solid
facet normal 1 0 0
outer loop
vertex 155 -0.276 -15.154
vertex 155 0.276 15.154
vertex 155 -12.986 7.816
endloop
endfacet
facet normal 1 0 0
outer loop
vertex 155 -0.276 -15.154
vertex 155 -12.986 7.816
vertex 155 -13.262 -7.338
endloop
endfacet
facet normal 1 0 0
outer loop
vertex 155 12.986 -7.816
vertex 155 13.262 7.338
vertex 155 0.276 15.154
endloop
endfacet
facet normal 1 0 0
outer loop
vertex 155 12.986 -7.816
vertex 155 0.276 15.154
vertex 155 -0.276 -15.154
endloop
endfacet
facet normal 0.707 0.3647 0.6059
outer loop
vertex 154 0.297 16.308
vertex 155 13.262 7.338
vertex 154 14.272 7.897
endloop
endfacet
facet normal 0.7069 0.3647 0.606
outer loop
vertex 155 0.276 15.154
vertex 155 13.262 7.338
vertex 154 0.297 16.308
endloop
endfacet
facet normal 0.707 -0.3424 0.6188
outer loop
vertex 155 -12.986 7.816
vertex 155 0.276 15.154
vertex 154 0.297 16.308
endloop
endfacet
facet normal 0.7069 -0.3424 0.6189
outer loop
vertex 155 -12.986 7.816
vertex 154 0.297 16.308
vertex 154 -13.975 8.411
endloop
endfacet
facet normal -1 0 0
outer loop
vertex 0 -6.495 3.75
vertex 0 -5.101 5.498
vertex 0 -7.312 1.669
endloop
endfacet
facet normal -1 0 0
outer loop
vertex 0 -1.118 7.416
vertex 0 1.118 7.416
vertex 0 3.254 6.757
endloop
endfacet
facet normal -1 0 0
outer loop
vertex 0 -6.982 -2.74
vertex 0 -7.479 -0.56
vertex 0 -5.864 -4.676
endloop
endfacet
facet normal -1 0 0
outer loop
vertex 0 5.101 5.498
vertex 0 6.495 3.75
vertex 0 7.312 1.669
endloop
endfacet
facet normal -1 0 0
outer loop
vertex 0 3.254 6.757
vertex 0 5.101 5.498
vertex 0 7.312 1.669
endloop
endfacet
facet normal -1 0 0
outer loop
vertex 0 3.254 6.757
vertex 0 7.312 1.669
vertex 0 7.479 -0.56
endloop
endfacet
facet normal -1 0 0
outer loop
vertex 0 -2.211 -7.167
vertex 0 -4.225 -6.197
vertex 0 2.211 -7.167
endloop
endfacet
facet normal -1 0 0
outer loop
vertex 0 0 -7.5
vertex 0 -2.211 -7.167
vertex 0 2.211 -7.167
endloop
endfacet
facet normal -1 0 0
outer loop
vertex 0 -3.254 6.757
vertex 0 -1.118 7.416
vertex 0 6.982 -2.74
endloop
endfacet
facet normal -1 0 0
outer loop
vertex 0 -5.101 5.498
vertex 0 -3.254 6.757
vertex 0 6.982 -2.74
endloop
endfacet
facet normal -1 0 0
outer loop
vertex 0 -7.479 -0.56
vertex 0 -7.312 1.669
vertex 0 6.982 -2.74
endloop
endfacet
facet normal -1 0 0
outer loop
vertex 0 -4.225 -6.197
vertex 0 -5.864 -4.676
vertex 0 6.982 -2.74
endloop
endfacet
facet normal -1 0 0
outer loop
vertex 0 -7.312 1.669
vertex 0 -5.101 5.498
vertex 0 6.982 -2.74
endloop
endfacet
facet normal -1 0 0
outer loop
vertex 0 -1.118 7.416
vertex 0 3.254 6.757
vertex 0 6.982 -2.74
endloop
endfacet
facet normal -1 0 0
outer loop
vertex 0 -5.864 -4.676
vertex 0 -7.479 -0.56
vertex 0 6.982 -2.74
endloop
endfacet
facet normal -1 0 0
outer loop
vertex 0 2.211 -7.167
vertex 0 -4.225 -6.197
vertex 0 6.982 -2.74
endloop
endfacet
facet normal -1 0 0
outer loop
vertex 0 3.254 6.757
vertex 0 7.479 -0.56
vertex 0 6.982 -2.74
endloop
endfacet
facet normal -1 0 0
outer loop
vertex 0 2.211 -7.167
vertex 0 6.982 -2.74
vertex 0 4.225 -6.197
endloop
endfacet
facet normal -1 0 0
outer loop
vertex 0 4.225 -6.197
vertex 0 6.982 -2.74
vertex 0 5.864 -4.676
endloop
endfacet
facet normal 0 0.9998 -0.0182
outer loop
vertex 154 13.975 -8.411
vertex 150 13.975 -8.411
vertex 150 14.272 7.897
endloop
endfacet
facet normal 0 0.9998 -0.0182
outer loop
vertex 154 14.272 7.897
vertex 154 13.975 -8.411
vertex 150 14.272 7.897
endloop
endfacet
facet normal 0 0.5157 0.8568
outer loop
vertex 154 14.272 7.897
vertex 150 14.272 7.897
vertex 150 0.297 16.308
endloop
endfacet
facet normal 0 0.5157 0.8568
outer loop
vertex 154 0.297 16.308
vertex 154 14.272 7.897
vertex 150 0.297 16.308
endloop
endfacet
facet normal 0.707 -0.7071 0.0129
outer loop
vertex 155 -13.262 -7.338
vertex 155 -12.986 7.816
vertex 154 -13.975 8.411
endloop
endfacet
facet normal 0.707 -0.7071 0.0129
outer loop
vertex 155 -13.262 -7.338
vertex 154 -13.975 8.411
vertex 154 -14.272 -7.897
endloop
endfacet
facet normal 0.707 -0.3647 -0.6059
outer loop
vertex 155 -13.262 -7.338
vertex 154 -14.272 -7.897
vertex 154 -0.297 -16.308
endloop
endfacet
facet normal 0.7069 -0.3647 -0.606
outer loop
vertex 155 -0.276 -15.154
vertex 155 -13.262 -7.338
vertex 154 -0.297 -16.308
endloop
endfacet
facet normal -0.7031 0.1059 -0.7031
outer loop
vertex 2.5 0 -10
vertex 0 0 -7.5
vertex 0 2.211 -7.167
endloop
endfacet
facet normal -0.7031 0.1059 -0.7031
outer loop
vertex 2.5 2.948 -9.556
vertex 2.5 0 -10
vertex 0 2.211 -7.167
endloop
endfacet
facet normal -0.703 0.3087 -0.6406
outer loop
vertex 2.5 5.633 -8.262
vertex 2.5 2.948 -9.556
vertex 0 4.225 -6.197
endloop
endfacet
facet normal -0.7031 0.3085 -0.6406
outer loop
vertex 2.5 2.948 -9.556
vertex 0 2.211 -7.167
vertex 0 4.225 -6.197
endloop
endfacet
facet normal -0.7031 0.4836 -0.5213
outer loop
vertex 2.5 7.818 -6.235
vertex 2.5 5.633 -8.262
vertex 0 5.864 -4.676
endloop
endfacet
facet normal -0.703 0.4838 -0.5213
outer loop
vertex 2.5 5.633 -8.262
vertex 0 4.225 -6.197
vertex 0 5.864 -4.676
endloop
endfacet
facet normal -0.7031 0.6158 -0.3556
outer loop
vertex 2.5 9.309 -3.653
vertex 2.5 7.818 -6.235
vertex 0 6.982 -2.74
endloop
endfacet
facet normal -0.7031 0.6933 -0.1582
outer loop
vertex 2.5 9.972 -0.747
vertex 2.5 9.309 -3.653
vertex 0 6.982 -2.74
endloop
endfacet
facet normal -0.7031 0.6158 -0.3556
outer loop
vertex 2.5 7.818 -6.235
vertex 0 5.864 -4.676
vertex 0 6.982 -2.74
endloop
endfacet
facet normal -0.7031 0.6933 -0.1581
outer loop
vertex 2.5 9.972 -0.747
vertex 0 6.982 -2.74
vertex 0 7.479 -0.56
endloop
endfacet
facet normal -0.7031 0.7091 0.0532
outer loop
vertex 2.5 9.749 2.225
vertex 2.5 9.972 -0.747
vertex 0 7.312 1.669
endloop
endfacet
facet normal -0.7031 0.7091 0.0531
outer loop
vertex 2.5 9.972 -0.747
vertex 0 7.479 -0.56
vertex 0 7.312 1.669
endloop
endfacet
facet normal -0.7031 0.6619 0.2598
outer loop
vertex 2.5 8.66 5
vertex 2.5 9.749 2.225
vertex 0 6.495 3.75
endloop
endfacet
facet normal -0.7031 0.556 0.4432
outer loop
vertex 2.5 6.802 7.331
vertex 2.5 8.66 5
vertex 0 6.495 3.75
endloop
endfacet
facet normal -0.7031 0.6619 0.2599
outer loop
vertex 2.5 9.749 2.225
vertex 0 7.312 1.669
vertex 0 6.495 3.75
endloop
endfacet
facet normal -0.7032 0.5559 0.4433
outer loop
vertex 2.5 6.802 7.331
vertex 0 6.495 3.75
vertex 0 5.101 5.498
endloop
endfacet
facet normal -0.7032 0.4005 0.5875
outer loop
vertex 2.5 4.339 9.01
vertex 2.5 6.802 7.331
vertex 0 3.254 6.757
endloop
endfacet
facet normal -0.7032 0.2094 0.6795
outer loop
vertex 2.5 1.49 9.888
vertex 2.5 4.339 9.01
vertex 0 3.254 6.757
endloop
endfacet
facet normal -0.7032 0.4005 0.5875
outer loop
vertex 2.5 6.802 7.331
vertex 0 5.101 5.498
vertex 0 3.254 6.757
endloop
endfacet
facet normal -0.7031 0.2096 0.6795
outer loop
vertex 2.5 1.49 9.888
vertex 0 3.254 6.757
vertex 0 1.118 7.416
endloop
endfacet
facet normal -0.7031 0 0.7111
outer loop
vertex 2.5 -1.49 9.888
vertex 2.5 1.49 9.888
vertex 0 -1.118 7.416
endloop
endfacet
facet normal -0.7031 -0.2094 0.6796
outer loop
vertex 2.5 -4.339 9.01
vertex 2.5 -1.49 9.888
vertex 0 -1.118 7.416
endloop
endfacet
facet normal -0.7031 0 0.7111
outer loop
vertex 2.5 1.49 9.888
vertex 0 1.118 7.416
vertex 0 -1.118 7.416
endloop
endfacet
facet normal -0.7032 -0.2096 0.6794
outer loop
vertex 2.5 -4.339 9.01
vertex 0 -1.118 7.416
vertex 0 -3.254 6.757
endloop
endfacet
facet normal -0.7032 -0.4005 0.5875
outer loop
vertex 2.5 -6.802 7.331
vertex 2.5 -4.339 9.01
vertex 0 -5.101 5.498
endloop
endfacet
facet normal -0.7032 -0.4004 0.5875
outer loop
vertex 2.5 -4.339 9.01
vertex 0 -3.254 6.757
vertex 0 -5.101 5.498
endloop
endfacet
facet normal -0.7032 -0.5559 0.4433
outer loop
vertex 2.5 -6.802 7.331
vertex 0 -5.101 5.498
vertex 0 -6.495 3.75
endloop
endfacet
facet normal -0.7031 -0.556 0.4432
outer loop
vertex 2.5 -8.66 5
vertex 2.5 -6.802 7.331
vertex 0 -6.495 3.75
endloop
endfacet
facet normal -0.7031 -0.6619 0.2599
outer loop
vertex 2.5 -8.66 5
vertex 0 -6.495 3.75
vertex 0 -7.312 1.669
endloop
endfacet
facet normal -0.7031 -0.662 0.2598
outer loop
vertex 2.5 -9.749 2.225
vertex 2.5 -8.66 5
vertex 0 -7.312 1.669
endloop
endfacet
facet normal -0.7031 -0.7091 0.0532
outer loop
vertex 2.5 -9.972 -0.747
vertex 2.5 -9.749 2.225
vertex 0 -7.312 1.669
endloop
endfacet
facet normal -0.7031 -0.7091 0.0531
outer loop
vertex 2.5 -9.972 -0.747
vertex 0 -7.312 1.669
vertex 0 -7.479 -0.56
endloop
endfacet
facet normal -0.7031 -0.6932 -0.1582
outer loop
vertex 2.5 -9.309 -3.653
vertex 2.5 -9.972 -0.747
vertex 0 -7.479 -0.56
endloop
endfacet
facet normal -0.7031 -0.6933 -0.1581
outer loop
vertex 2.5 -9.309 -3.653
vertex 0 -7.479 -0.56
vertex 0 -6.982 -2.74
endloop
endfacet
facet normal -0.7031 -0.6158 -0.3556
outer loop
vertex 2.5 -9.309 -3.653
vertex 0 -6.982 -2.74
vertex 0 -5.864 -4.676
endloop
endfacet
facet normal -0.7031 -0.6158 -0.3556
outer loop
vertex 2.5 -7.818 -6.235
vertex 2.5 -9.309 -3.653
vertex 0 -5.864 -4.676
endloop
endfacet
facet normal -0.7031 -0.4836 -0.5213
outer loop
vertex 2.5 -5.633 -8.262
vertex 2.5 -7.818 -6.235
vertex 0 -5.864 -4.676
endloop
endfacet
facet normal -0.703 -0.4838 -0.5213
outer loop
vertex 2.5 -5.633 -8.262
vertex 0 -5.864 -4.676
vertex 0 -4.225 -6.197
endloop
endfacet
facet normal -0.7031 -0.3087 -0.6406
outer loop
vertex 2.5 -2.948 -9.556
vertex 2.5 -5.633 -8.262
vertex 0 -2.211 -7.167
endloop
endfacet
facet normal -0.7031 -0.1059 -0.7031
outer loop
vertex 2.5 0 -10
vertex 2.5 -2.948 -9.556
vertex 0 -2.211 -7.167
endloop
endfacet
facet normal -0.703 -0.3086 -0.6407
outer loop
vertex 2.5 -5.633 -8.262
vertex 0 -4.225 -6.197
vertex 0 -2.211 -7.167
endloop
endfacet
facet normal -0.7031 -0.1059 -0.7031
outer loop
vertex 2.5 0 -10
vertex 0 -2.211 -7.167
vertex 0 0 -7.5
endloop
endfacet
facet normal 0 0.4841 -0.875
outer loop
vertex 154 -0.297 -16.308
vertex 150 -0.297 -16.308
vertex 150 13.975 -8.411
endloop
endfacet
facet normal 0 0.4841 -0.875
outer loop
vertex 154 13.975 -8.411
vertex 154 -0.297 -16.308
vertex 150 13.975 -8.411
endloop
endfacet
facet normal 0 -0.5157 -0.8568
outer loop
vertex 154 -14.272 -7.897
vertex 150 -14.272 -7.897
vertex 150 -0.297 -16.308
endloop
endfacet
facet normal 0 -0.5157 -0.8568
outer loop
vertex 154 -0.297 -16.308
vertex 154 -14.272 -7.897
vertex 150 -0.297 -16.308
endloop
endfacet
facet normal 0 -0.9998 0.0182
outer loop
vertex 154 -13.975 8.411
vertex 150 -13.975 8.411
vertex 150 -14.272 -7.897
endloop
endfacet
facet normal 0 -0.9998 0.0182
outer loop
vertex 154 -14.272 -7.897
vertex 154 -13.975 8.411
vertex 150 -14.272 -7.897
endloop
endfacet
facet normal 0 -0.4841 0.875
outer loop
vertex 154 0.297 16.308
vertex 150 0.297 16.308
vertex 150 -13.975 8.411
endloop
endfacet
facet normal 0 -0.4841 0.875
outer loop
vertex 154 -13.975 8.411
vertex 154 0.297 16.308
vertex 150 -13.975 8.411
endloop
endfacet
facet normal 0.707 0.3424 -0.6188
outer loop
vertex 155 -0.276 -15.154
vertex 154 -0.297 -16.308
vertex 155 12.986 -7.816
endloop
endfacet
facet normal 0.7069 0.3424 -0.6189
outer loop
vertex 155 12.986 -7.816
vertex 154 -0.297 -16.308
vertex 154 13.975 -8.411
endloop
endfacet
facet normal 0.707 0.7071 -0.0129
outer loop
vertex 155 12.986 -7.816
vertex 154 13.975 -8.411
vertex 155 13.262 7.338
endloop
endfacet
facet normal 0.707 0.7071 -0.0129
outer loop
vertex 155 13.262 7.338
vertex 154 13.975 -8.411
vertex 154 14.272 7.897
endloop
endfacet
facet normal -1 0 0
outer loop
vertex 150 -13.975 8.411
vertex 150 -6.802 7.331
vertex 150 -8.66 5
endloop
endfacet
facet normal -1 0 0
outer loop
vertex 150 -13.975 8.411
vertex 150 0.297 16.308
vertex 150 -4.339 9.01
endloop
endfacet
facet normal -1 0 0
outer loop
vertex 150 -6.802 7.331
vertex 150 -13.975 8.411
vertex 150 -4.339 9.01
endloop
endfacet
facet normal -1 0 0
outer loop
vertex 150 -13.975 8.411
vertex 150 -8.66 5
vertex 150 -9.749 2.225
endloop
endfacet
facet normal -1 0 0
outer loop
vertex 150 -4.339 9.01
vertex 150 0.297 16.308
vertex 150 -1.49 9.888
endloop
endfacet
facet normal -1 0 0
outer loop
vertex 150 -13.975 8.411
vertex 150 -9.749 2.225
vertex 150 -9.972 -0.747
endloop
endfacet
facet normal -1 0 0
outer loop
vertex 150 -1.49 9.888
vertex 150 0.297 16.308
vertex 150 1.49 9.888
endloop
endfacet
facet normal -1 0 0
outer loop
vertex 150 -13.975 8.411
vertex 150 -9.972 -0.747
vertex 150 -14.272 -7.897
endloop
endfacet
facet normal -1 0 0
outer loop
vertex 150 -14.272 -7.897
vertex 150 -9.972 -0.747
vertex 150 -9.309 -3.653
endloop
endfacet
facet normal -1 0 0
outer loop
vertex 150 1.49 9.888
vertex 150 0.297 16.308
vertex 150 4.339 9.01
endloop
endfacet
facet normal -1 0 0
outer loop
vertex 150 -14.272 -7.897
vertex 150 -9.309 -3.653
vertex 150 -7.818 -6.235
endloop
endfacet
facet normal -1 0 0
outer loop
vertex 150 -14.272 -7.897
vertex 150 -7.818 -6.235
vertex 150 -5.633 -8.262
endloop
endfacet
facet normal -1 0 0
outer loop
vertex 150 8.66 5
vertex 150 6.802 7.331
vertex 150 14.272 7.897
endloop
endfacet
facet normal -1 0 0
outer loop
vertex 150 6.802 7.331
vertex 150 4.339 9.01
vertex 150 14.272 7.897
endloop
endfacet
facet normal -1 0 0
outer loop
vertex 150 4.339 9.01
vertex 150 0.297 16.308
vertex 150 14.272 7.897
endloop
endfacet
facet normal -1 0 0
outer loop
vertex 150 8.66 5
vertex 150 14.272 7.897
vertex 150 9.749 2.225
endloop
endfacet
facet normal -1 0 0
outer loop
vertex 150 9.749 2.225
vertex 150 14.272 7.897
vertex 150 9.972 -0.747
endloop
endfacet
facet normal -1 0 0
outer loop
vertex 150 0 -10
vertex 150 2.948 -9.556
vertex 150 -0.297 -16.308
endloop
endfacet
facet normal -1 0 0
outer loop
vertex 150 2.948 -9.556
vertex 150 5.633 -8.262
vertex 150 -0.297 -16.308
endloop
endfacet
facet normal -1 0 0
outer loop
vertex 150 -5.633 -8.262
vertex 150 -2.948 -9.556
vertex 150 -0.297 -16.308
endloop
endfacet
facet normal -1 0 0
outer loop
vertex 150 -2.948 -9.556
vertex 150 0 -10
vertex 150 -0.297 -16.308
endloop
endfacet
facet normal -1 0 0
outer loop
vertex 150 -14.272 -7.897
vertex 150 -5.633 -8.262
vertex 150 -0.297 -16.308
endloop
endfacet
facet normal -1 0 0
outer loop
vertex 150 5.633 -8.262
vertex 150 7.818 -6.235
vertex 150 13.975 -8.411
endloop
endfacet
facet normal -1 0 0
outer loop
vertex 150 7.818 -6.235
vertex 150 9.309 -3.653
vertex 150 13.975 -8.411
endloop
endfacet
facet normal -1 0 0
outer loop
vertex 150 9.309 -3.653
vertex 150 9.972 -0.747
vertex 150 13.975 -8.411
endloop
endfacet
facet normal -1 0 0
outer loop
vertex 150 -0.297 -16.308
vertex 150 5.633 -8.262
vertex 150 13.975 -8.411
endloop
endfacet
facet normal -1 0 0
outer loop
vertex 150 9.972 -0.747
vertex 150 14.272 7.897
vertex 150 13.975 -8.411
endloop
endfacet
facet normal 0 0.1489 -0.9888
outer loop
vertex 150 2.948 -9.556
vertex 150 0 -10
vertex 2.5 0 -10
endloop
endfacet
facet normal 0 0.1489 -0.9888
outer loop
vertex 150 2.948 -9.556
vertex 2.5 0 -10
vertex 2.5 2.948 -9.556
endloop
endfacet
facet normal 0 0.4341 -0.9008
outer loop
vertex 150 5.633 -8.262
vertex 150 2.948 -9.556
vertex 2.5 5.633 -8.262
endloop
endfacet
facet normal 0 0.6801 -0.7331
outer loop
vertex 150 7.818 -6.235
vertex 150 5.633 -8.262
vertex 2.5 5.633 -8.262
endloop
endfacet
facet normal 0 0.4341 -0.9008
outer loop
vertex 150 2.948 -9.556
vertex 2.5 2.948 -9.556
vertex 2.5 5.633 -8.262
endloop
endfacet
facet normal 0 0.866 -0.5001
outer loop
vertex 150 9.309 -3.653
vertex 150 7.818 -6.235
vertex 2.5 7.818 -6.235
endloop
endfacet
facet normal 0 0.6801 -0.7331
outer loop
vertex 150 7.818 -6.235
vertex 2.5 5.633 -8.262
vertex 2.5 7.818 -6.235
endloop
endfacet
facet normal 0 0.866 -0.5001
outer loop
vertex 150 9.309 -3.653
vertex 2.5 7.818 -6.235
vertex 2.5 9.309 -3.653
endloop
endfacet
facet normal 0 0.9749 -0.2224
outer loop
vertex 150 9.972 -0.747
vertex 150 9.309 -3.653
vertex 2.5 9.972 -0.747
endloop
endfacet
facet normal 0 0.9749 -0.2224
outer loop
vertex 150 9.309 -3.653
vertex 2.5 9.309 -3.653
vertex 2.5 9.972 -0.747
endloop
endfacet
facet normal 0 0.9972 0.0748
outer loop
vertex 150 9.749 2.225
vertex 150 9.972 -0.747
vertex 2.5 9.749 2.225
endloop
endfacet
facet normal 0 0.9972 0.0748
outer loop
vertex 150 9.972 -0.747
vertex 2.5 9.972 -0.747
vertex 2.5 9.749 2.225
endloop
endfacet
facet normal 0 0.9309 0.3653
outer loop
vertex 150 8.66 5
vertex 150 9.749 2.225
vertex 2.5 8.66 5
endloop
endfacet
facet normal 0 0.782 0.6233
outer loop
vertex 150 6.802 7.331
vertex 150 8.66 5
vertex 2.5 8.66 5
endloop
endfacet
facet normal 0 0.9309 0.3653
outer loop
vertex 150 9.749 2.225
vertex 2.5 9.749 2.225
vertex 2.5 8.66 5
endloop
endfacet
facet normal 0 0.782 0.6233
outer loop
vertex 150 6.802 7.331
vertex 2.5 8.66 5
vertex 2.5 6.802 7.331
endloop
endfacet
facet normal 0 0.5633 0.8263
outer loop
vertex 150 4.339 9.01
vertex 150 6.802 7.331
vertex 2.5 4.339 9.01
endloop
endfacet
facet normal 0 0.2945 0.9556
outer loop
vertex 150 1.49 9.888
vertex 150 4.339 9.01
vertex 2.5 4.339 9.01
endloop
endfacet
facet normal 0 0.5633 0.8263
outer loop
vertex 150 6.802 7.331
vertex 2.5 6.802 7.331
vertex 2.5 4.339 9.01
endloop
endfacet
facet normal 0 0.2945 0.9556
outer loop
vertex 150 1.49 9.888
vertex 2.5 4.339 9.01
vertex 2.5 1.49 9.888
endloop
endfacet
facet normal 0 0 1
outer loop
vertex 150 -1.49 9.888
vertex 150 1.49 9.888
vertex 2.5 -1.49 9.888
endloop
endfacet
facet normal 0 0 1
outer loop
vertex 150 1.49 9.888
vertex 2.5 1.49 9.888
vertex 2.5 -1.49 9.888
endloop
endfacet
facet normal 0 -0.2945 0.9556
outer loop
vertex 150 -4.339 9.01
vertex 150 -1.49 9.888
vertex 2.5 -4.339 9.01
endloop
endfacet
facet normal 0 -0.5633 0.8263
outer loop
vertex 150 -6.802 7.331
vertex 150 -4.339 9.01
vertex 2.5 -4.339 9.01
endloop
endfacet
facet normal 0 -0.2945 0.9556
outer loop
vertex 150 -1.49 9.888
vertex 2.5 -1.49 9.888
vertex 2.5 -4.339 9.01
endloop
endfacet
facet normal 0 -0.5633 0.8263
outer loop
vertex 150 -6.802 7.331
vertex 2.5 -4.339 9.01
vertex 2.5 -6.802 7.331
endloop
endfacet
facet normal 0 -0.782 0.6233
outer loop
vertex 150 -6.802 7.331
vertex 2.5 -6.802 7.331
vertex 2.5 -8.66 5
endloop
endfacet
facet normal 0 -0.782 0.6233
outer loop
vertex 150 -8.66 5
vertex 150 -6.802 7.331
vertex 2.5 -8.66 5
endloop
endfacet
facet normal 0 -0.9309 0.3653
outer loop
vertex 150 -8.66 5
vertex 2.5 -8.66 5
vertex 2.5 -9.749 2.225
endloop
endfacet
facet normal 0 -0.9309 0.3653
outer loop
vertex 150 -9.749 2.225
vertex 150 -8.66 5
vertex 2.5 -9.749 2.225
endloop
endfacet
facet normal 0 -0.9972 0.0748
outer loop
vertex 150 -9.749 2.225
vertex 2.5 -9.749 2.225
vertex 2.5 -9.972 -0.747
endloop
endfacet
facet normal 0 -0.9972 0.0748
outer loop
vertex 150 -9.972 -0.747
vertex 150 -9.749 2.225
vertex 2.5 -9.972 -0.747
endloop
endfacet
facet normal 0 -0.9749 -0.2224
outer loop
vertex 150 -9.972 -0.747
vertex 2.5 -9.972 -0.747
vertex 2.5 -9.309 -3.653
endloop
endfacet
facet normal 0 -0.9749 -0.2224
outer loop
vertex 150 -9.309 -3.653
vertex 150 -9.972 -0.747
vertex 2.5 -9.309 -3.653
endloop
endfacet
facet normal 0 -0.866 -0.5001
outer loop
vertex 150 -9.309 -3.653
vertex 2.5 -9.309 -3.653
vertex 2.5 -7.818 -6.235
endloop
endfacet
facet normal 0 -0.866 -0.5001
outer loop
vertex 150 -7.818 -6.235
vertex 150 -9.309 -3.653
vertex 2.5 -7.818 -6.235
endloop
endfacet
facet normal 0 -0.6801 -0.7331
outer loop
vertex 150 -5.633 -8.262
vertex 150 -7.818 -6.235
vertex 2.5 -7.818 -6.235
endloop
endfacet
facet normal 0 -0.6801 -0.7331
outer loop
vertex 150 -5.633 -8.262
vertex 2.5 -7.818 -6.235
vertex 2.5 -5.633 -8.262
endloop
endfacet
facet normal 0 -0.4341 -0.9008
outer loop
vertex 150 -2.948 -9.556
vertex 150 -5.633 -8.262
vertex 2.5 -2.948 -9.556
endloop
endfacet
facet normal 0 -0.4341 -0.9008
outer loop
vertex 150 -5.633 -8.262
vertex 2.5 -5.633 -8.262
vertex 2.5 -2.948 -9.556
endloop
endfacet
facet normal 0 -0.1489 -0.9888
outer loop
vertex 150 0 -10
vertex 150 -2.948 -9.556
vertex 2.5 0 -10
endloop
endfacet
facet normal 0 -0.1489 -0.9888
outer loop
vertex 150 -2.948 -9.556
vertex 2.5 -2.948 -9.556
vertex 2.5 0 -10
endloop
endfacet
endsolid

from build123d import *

# Parameters (mm, degrees)
SKETCH1_R           = 10
BOSS_EXTRUDE1_DEPTH = 150
BOSS_EXTRUDE2_DEPTH = 5
CHAMFER1_SIZE       = 1
CHAMFER3_SIZE       = 2.5


with BuildPart() as part:
    # Sketch1 → Boss-Extrude1 (new body)
    with BuildSketch(Plane(origin=(0, 0, 0), x_dir=(0, 0, -1), z_dir=(1, 0, 0))):
        Circle(SKETCH1_R)
    extrude(amount=BOSS_EXTRUDE1_DEPTH)

    # Sketch2 → Boss-Extrude2 (add)
    with BuildSketch(Plane(origin=(150, 0, 0), x_dir=(0, 0, -1), z_dir=(1, 0, 0))):
        Polygon((-16.308454096, 0.29661326), (-8.411101666, -13.975228914), (7.89735243, -14.271842174), (16.308454096, -0.29661326), (8.411101666, 13.975228914), (-7.89735243, 14.271842174), align=None)
    extrude(amount=BOSS_EXTRUDE2_DEPTH)

    # Chamfer1
    chamfer1_edges = [part.edges().sort_by_distance(p)[0] for p in [
        (155, 7.284227717, 12.102903263),
        (155, -6.839307827, 12.359777881),
        (155, -14.123535544, 0.256874618),
        (155, -7.284227717, -12.102903263),
        (155, 6.839307827, -12.359777881),
        (155, 14.123535544, -0.256874618),
    ]]
    chamfer(chamfer1_edges, length=CHAMFER1_SIZE)

    # Chamfer3
    chamfer3_edges = [part.edges().sort_by_distance(p)[0] for p in [
        (0, 0, 10),
    ]]
    chamfer(chamfer3_edges, length=CHAMFER3_SIZE)


solid = part.part
